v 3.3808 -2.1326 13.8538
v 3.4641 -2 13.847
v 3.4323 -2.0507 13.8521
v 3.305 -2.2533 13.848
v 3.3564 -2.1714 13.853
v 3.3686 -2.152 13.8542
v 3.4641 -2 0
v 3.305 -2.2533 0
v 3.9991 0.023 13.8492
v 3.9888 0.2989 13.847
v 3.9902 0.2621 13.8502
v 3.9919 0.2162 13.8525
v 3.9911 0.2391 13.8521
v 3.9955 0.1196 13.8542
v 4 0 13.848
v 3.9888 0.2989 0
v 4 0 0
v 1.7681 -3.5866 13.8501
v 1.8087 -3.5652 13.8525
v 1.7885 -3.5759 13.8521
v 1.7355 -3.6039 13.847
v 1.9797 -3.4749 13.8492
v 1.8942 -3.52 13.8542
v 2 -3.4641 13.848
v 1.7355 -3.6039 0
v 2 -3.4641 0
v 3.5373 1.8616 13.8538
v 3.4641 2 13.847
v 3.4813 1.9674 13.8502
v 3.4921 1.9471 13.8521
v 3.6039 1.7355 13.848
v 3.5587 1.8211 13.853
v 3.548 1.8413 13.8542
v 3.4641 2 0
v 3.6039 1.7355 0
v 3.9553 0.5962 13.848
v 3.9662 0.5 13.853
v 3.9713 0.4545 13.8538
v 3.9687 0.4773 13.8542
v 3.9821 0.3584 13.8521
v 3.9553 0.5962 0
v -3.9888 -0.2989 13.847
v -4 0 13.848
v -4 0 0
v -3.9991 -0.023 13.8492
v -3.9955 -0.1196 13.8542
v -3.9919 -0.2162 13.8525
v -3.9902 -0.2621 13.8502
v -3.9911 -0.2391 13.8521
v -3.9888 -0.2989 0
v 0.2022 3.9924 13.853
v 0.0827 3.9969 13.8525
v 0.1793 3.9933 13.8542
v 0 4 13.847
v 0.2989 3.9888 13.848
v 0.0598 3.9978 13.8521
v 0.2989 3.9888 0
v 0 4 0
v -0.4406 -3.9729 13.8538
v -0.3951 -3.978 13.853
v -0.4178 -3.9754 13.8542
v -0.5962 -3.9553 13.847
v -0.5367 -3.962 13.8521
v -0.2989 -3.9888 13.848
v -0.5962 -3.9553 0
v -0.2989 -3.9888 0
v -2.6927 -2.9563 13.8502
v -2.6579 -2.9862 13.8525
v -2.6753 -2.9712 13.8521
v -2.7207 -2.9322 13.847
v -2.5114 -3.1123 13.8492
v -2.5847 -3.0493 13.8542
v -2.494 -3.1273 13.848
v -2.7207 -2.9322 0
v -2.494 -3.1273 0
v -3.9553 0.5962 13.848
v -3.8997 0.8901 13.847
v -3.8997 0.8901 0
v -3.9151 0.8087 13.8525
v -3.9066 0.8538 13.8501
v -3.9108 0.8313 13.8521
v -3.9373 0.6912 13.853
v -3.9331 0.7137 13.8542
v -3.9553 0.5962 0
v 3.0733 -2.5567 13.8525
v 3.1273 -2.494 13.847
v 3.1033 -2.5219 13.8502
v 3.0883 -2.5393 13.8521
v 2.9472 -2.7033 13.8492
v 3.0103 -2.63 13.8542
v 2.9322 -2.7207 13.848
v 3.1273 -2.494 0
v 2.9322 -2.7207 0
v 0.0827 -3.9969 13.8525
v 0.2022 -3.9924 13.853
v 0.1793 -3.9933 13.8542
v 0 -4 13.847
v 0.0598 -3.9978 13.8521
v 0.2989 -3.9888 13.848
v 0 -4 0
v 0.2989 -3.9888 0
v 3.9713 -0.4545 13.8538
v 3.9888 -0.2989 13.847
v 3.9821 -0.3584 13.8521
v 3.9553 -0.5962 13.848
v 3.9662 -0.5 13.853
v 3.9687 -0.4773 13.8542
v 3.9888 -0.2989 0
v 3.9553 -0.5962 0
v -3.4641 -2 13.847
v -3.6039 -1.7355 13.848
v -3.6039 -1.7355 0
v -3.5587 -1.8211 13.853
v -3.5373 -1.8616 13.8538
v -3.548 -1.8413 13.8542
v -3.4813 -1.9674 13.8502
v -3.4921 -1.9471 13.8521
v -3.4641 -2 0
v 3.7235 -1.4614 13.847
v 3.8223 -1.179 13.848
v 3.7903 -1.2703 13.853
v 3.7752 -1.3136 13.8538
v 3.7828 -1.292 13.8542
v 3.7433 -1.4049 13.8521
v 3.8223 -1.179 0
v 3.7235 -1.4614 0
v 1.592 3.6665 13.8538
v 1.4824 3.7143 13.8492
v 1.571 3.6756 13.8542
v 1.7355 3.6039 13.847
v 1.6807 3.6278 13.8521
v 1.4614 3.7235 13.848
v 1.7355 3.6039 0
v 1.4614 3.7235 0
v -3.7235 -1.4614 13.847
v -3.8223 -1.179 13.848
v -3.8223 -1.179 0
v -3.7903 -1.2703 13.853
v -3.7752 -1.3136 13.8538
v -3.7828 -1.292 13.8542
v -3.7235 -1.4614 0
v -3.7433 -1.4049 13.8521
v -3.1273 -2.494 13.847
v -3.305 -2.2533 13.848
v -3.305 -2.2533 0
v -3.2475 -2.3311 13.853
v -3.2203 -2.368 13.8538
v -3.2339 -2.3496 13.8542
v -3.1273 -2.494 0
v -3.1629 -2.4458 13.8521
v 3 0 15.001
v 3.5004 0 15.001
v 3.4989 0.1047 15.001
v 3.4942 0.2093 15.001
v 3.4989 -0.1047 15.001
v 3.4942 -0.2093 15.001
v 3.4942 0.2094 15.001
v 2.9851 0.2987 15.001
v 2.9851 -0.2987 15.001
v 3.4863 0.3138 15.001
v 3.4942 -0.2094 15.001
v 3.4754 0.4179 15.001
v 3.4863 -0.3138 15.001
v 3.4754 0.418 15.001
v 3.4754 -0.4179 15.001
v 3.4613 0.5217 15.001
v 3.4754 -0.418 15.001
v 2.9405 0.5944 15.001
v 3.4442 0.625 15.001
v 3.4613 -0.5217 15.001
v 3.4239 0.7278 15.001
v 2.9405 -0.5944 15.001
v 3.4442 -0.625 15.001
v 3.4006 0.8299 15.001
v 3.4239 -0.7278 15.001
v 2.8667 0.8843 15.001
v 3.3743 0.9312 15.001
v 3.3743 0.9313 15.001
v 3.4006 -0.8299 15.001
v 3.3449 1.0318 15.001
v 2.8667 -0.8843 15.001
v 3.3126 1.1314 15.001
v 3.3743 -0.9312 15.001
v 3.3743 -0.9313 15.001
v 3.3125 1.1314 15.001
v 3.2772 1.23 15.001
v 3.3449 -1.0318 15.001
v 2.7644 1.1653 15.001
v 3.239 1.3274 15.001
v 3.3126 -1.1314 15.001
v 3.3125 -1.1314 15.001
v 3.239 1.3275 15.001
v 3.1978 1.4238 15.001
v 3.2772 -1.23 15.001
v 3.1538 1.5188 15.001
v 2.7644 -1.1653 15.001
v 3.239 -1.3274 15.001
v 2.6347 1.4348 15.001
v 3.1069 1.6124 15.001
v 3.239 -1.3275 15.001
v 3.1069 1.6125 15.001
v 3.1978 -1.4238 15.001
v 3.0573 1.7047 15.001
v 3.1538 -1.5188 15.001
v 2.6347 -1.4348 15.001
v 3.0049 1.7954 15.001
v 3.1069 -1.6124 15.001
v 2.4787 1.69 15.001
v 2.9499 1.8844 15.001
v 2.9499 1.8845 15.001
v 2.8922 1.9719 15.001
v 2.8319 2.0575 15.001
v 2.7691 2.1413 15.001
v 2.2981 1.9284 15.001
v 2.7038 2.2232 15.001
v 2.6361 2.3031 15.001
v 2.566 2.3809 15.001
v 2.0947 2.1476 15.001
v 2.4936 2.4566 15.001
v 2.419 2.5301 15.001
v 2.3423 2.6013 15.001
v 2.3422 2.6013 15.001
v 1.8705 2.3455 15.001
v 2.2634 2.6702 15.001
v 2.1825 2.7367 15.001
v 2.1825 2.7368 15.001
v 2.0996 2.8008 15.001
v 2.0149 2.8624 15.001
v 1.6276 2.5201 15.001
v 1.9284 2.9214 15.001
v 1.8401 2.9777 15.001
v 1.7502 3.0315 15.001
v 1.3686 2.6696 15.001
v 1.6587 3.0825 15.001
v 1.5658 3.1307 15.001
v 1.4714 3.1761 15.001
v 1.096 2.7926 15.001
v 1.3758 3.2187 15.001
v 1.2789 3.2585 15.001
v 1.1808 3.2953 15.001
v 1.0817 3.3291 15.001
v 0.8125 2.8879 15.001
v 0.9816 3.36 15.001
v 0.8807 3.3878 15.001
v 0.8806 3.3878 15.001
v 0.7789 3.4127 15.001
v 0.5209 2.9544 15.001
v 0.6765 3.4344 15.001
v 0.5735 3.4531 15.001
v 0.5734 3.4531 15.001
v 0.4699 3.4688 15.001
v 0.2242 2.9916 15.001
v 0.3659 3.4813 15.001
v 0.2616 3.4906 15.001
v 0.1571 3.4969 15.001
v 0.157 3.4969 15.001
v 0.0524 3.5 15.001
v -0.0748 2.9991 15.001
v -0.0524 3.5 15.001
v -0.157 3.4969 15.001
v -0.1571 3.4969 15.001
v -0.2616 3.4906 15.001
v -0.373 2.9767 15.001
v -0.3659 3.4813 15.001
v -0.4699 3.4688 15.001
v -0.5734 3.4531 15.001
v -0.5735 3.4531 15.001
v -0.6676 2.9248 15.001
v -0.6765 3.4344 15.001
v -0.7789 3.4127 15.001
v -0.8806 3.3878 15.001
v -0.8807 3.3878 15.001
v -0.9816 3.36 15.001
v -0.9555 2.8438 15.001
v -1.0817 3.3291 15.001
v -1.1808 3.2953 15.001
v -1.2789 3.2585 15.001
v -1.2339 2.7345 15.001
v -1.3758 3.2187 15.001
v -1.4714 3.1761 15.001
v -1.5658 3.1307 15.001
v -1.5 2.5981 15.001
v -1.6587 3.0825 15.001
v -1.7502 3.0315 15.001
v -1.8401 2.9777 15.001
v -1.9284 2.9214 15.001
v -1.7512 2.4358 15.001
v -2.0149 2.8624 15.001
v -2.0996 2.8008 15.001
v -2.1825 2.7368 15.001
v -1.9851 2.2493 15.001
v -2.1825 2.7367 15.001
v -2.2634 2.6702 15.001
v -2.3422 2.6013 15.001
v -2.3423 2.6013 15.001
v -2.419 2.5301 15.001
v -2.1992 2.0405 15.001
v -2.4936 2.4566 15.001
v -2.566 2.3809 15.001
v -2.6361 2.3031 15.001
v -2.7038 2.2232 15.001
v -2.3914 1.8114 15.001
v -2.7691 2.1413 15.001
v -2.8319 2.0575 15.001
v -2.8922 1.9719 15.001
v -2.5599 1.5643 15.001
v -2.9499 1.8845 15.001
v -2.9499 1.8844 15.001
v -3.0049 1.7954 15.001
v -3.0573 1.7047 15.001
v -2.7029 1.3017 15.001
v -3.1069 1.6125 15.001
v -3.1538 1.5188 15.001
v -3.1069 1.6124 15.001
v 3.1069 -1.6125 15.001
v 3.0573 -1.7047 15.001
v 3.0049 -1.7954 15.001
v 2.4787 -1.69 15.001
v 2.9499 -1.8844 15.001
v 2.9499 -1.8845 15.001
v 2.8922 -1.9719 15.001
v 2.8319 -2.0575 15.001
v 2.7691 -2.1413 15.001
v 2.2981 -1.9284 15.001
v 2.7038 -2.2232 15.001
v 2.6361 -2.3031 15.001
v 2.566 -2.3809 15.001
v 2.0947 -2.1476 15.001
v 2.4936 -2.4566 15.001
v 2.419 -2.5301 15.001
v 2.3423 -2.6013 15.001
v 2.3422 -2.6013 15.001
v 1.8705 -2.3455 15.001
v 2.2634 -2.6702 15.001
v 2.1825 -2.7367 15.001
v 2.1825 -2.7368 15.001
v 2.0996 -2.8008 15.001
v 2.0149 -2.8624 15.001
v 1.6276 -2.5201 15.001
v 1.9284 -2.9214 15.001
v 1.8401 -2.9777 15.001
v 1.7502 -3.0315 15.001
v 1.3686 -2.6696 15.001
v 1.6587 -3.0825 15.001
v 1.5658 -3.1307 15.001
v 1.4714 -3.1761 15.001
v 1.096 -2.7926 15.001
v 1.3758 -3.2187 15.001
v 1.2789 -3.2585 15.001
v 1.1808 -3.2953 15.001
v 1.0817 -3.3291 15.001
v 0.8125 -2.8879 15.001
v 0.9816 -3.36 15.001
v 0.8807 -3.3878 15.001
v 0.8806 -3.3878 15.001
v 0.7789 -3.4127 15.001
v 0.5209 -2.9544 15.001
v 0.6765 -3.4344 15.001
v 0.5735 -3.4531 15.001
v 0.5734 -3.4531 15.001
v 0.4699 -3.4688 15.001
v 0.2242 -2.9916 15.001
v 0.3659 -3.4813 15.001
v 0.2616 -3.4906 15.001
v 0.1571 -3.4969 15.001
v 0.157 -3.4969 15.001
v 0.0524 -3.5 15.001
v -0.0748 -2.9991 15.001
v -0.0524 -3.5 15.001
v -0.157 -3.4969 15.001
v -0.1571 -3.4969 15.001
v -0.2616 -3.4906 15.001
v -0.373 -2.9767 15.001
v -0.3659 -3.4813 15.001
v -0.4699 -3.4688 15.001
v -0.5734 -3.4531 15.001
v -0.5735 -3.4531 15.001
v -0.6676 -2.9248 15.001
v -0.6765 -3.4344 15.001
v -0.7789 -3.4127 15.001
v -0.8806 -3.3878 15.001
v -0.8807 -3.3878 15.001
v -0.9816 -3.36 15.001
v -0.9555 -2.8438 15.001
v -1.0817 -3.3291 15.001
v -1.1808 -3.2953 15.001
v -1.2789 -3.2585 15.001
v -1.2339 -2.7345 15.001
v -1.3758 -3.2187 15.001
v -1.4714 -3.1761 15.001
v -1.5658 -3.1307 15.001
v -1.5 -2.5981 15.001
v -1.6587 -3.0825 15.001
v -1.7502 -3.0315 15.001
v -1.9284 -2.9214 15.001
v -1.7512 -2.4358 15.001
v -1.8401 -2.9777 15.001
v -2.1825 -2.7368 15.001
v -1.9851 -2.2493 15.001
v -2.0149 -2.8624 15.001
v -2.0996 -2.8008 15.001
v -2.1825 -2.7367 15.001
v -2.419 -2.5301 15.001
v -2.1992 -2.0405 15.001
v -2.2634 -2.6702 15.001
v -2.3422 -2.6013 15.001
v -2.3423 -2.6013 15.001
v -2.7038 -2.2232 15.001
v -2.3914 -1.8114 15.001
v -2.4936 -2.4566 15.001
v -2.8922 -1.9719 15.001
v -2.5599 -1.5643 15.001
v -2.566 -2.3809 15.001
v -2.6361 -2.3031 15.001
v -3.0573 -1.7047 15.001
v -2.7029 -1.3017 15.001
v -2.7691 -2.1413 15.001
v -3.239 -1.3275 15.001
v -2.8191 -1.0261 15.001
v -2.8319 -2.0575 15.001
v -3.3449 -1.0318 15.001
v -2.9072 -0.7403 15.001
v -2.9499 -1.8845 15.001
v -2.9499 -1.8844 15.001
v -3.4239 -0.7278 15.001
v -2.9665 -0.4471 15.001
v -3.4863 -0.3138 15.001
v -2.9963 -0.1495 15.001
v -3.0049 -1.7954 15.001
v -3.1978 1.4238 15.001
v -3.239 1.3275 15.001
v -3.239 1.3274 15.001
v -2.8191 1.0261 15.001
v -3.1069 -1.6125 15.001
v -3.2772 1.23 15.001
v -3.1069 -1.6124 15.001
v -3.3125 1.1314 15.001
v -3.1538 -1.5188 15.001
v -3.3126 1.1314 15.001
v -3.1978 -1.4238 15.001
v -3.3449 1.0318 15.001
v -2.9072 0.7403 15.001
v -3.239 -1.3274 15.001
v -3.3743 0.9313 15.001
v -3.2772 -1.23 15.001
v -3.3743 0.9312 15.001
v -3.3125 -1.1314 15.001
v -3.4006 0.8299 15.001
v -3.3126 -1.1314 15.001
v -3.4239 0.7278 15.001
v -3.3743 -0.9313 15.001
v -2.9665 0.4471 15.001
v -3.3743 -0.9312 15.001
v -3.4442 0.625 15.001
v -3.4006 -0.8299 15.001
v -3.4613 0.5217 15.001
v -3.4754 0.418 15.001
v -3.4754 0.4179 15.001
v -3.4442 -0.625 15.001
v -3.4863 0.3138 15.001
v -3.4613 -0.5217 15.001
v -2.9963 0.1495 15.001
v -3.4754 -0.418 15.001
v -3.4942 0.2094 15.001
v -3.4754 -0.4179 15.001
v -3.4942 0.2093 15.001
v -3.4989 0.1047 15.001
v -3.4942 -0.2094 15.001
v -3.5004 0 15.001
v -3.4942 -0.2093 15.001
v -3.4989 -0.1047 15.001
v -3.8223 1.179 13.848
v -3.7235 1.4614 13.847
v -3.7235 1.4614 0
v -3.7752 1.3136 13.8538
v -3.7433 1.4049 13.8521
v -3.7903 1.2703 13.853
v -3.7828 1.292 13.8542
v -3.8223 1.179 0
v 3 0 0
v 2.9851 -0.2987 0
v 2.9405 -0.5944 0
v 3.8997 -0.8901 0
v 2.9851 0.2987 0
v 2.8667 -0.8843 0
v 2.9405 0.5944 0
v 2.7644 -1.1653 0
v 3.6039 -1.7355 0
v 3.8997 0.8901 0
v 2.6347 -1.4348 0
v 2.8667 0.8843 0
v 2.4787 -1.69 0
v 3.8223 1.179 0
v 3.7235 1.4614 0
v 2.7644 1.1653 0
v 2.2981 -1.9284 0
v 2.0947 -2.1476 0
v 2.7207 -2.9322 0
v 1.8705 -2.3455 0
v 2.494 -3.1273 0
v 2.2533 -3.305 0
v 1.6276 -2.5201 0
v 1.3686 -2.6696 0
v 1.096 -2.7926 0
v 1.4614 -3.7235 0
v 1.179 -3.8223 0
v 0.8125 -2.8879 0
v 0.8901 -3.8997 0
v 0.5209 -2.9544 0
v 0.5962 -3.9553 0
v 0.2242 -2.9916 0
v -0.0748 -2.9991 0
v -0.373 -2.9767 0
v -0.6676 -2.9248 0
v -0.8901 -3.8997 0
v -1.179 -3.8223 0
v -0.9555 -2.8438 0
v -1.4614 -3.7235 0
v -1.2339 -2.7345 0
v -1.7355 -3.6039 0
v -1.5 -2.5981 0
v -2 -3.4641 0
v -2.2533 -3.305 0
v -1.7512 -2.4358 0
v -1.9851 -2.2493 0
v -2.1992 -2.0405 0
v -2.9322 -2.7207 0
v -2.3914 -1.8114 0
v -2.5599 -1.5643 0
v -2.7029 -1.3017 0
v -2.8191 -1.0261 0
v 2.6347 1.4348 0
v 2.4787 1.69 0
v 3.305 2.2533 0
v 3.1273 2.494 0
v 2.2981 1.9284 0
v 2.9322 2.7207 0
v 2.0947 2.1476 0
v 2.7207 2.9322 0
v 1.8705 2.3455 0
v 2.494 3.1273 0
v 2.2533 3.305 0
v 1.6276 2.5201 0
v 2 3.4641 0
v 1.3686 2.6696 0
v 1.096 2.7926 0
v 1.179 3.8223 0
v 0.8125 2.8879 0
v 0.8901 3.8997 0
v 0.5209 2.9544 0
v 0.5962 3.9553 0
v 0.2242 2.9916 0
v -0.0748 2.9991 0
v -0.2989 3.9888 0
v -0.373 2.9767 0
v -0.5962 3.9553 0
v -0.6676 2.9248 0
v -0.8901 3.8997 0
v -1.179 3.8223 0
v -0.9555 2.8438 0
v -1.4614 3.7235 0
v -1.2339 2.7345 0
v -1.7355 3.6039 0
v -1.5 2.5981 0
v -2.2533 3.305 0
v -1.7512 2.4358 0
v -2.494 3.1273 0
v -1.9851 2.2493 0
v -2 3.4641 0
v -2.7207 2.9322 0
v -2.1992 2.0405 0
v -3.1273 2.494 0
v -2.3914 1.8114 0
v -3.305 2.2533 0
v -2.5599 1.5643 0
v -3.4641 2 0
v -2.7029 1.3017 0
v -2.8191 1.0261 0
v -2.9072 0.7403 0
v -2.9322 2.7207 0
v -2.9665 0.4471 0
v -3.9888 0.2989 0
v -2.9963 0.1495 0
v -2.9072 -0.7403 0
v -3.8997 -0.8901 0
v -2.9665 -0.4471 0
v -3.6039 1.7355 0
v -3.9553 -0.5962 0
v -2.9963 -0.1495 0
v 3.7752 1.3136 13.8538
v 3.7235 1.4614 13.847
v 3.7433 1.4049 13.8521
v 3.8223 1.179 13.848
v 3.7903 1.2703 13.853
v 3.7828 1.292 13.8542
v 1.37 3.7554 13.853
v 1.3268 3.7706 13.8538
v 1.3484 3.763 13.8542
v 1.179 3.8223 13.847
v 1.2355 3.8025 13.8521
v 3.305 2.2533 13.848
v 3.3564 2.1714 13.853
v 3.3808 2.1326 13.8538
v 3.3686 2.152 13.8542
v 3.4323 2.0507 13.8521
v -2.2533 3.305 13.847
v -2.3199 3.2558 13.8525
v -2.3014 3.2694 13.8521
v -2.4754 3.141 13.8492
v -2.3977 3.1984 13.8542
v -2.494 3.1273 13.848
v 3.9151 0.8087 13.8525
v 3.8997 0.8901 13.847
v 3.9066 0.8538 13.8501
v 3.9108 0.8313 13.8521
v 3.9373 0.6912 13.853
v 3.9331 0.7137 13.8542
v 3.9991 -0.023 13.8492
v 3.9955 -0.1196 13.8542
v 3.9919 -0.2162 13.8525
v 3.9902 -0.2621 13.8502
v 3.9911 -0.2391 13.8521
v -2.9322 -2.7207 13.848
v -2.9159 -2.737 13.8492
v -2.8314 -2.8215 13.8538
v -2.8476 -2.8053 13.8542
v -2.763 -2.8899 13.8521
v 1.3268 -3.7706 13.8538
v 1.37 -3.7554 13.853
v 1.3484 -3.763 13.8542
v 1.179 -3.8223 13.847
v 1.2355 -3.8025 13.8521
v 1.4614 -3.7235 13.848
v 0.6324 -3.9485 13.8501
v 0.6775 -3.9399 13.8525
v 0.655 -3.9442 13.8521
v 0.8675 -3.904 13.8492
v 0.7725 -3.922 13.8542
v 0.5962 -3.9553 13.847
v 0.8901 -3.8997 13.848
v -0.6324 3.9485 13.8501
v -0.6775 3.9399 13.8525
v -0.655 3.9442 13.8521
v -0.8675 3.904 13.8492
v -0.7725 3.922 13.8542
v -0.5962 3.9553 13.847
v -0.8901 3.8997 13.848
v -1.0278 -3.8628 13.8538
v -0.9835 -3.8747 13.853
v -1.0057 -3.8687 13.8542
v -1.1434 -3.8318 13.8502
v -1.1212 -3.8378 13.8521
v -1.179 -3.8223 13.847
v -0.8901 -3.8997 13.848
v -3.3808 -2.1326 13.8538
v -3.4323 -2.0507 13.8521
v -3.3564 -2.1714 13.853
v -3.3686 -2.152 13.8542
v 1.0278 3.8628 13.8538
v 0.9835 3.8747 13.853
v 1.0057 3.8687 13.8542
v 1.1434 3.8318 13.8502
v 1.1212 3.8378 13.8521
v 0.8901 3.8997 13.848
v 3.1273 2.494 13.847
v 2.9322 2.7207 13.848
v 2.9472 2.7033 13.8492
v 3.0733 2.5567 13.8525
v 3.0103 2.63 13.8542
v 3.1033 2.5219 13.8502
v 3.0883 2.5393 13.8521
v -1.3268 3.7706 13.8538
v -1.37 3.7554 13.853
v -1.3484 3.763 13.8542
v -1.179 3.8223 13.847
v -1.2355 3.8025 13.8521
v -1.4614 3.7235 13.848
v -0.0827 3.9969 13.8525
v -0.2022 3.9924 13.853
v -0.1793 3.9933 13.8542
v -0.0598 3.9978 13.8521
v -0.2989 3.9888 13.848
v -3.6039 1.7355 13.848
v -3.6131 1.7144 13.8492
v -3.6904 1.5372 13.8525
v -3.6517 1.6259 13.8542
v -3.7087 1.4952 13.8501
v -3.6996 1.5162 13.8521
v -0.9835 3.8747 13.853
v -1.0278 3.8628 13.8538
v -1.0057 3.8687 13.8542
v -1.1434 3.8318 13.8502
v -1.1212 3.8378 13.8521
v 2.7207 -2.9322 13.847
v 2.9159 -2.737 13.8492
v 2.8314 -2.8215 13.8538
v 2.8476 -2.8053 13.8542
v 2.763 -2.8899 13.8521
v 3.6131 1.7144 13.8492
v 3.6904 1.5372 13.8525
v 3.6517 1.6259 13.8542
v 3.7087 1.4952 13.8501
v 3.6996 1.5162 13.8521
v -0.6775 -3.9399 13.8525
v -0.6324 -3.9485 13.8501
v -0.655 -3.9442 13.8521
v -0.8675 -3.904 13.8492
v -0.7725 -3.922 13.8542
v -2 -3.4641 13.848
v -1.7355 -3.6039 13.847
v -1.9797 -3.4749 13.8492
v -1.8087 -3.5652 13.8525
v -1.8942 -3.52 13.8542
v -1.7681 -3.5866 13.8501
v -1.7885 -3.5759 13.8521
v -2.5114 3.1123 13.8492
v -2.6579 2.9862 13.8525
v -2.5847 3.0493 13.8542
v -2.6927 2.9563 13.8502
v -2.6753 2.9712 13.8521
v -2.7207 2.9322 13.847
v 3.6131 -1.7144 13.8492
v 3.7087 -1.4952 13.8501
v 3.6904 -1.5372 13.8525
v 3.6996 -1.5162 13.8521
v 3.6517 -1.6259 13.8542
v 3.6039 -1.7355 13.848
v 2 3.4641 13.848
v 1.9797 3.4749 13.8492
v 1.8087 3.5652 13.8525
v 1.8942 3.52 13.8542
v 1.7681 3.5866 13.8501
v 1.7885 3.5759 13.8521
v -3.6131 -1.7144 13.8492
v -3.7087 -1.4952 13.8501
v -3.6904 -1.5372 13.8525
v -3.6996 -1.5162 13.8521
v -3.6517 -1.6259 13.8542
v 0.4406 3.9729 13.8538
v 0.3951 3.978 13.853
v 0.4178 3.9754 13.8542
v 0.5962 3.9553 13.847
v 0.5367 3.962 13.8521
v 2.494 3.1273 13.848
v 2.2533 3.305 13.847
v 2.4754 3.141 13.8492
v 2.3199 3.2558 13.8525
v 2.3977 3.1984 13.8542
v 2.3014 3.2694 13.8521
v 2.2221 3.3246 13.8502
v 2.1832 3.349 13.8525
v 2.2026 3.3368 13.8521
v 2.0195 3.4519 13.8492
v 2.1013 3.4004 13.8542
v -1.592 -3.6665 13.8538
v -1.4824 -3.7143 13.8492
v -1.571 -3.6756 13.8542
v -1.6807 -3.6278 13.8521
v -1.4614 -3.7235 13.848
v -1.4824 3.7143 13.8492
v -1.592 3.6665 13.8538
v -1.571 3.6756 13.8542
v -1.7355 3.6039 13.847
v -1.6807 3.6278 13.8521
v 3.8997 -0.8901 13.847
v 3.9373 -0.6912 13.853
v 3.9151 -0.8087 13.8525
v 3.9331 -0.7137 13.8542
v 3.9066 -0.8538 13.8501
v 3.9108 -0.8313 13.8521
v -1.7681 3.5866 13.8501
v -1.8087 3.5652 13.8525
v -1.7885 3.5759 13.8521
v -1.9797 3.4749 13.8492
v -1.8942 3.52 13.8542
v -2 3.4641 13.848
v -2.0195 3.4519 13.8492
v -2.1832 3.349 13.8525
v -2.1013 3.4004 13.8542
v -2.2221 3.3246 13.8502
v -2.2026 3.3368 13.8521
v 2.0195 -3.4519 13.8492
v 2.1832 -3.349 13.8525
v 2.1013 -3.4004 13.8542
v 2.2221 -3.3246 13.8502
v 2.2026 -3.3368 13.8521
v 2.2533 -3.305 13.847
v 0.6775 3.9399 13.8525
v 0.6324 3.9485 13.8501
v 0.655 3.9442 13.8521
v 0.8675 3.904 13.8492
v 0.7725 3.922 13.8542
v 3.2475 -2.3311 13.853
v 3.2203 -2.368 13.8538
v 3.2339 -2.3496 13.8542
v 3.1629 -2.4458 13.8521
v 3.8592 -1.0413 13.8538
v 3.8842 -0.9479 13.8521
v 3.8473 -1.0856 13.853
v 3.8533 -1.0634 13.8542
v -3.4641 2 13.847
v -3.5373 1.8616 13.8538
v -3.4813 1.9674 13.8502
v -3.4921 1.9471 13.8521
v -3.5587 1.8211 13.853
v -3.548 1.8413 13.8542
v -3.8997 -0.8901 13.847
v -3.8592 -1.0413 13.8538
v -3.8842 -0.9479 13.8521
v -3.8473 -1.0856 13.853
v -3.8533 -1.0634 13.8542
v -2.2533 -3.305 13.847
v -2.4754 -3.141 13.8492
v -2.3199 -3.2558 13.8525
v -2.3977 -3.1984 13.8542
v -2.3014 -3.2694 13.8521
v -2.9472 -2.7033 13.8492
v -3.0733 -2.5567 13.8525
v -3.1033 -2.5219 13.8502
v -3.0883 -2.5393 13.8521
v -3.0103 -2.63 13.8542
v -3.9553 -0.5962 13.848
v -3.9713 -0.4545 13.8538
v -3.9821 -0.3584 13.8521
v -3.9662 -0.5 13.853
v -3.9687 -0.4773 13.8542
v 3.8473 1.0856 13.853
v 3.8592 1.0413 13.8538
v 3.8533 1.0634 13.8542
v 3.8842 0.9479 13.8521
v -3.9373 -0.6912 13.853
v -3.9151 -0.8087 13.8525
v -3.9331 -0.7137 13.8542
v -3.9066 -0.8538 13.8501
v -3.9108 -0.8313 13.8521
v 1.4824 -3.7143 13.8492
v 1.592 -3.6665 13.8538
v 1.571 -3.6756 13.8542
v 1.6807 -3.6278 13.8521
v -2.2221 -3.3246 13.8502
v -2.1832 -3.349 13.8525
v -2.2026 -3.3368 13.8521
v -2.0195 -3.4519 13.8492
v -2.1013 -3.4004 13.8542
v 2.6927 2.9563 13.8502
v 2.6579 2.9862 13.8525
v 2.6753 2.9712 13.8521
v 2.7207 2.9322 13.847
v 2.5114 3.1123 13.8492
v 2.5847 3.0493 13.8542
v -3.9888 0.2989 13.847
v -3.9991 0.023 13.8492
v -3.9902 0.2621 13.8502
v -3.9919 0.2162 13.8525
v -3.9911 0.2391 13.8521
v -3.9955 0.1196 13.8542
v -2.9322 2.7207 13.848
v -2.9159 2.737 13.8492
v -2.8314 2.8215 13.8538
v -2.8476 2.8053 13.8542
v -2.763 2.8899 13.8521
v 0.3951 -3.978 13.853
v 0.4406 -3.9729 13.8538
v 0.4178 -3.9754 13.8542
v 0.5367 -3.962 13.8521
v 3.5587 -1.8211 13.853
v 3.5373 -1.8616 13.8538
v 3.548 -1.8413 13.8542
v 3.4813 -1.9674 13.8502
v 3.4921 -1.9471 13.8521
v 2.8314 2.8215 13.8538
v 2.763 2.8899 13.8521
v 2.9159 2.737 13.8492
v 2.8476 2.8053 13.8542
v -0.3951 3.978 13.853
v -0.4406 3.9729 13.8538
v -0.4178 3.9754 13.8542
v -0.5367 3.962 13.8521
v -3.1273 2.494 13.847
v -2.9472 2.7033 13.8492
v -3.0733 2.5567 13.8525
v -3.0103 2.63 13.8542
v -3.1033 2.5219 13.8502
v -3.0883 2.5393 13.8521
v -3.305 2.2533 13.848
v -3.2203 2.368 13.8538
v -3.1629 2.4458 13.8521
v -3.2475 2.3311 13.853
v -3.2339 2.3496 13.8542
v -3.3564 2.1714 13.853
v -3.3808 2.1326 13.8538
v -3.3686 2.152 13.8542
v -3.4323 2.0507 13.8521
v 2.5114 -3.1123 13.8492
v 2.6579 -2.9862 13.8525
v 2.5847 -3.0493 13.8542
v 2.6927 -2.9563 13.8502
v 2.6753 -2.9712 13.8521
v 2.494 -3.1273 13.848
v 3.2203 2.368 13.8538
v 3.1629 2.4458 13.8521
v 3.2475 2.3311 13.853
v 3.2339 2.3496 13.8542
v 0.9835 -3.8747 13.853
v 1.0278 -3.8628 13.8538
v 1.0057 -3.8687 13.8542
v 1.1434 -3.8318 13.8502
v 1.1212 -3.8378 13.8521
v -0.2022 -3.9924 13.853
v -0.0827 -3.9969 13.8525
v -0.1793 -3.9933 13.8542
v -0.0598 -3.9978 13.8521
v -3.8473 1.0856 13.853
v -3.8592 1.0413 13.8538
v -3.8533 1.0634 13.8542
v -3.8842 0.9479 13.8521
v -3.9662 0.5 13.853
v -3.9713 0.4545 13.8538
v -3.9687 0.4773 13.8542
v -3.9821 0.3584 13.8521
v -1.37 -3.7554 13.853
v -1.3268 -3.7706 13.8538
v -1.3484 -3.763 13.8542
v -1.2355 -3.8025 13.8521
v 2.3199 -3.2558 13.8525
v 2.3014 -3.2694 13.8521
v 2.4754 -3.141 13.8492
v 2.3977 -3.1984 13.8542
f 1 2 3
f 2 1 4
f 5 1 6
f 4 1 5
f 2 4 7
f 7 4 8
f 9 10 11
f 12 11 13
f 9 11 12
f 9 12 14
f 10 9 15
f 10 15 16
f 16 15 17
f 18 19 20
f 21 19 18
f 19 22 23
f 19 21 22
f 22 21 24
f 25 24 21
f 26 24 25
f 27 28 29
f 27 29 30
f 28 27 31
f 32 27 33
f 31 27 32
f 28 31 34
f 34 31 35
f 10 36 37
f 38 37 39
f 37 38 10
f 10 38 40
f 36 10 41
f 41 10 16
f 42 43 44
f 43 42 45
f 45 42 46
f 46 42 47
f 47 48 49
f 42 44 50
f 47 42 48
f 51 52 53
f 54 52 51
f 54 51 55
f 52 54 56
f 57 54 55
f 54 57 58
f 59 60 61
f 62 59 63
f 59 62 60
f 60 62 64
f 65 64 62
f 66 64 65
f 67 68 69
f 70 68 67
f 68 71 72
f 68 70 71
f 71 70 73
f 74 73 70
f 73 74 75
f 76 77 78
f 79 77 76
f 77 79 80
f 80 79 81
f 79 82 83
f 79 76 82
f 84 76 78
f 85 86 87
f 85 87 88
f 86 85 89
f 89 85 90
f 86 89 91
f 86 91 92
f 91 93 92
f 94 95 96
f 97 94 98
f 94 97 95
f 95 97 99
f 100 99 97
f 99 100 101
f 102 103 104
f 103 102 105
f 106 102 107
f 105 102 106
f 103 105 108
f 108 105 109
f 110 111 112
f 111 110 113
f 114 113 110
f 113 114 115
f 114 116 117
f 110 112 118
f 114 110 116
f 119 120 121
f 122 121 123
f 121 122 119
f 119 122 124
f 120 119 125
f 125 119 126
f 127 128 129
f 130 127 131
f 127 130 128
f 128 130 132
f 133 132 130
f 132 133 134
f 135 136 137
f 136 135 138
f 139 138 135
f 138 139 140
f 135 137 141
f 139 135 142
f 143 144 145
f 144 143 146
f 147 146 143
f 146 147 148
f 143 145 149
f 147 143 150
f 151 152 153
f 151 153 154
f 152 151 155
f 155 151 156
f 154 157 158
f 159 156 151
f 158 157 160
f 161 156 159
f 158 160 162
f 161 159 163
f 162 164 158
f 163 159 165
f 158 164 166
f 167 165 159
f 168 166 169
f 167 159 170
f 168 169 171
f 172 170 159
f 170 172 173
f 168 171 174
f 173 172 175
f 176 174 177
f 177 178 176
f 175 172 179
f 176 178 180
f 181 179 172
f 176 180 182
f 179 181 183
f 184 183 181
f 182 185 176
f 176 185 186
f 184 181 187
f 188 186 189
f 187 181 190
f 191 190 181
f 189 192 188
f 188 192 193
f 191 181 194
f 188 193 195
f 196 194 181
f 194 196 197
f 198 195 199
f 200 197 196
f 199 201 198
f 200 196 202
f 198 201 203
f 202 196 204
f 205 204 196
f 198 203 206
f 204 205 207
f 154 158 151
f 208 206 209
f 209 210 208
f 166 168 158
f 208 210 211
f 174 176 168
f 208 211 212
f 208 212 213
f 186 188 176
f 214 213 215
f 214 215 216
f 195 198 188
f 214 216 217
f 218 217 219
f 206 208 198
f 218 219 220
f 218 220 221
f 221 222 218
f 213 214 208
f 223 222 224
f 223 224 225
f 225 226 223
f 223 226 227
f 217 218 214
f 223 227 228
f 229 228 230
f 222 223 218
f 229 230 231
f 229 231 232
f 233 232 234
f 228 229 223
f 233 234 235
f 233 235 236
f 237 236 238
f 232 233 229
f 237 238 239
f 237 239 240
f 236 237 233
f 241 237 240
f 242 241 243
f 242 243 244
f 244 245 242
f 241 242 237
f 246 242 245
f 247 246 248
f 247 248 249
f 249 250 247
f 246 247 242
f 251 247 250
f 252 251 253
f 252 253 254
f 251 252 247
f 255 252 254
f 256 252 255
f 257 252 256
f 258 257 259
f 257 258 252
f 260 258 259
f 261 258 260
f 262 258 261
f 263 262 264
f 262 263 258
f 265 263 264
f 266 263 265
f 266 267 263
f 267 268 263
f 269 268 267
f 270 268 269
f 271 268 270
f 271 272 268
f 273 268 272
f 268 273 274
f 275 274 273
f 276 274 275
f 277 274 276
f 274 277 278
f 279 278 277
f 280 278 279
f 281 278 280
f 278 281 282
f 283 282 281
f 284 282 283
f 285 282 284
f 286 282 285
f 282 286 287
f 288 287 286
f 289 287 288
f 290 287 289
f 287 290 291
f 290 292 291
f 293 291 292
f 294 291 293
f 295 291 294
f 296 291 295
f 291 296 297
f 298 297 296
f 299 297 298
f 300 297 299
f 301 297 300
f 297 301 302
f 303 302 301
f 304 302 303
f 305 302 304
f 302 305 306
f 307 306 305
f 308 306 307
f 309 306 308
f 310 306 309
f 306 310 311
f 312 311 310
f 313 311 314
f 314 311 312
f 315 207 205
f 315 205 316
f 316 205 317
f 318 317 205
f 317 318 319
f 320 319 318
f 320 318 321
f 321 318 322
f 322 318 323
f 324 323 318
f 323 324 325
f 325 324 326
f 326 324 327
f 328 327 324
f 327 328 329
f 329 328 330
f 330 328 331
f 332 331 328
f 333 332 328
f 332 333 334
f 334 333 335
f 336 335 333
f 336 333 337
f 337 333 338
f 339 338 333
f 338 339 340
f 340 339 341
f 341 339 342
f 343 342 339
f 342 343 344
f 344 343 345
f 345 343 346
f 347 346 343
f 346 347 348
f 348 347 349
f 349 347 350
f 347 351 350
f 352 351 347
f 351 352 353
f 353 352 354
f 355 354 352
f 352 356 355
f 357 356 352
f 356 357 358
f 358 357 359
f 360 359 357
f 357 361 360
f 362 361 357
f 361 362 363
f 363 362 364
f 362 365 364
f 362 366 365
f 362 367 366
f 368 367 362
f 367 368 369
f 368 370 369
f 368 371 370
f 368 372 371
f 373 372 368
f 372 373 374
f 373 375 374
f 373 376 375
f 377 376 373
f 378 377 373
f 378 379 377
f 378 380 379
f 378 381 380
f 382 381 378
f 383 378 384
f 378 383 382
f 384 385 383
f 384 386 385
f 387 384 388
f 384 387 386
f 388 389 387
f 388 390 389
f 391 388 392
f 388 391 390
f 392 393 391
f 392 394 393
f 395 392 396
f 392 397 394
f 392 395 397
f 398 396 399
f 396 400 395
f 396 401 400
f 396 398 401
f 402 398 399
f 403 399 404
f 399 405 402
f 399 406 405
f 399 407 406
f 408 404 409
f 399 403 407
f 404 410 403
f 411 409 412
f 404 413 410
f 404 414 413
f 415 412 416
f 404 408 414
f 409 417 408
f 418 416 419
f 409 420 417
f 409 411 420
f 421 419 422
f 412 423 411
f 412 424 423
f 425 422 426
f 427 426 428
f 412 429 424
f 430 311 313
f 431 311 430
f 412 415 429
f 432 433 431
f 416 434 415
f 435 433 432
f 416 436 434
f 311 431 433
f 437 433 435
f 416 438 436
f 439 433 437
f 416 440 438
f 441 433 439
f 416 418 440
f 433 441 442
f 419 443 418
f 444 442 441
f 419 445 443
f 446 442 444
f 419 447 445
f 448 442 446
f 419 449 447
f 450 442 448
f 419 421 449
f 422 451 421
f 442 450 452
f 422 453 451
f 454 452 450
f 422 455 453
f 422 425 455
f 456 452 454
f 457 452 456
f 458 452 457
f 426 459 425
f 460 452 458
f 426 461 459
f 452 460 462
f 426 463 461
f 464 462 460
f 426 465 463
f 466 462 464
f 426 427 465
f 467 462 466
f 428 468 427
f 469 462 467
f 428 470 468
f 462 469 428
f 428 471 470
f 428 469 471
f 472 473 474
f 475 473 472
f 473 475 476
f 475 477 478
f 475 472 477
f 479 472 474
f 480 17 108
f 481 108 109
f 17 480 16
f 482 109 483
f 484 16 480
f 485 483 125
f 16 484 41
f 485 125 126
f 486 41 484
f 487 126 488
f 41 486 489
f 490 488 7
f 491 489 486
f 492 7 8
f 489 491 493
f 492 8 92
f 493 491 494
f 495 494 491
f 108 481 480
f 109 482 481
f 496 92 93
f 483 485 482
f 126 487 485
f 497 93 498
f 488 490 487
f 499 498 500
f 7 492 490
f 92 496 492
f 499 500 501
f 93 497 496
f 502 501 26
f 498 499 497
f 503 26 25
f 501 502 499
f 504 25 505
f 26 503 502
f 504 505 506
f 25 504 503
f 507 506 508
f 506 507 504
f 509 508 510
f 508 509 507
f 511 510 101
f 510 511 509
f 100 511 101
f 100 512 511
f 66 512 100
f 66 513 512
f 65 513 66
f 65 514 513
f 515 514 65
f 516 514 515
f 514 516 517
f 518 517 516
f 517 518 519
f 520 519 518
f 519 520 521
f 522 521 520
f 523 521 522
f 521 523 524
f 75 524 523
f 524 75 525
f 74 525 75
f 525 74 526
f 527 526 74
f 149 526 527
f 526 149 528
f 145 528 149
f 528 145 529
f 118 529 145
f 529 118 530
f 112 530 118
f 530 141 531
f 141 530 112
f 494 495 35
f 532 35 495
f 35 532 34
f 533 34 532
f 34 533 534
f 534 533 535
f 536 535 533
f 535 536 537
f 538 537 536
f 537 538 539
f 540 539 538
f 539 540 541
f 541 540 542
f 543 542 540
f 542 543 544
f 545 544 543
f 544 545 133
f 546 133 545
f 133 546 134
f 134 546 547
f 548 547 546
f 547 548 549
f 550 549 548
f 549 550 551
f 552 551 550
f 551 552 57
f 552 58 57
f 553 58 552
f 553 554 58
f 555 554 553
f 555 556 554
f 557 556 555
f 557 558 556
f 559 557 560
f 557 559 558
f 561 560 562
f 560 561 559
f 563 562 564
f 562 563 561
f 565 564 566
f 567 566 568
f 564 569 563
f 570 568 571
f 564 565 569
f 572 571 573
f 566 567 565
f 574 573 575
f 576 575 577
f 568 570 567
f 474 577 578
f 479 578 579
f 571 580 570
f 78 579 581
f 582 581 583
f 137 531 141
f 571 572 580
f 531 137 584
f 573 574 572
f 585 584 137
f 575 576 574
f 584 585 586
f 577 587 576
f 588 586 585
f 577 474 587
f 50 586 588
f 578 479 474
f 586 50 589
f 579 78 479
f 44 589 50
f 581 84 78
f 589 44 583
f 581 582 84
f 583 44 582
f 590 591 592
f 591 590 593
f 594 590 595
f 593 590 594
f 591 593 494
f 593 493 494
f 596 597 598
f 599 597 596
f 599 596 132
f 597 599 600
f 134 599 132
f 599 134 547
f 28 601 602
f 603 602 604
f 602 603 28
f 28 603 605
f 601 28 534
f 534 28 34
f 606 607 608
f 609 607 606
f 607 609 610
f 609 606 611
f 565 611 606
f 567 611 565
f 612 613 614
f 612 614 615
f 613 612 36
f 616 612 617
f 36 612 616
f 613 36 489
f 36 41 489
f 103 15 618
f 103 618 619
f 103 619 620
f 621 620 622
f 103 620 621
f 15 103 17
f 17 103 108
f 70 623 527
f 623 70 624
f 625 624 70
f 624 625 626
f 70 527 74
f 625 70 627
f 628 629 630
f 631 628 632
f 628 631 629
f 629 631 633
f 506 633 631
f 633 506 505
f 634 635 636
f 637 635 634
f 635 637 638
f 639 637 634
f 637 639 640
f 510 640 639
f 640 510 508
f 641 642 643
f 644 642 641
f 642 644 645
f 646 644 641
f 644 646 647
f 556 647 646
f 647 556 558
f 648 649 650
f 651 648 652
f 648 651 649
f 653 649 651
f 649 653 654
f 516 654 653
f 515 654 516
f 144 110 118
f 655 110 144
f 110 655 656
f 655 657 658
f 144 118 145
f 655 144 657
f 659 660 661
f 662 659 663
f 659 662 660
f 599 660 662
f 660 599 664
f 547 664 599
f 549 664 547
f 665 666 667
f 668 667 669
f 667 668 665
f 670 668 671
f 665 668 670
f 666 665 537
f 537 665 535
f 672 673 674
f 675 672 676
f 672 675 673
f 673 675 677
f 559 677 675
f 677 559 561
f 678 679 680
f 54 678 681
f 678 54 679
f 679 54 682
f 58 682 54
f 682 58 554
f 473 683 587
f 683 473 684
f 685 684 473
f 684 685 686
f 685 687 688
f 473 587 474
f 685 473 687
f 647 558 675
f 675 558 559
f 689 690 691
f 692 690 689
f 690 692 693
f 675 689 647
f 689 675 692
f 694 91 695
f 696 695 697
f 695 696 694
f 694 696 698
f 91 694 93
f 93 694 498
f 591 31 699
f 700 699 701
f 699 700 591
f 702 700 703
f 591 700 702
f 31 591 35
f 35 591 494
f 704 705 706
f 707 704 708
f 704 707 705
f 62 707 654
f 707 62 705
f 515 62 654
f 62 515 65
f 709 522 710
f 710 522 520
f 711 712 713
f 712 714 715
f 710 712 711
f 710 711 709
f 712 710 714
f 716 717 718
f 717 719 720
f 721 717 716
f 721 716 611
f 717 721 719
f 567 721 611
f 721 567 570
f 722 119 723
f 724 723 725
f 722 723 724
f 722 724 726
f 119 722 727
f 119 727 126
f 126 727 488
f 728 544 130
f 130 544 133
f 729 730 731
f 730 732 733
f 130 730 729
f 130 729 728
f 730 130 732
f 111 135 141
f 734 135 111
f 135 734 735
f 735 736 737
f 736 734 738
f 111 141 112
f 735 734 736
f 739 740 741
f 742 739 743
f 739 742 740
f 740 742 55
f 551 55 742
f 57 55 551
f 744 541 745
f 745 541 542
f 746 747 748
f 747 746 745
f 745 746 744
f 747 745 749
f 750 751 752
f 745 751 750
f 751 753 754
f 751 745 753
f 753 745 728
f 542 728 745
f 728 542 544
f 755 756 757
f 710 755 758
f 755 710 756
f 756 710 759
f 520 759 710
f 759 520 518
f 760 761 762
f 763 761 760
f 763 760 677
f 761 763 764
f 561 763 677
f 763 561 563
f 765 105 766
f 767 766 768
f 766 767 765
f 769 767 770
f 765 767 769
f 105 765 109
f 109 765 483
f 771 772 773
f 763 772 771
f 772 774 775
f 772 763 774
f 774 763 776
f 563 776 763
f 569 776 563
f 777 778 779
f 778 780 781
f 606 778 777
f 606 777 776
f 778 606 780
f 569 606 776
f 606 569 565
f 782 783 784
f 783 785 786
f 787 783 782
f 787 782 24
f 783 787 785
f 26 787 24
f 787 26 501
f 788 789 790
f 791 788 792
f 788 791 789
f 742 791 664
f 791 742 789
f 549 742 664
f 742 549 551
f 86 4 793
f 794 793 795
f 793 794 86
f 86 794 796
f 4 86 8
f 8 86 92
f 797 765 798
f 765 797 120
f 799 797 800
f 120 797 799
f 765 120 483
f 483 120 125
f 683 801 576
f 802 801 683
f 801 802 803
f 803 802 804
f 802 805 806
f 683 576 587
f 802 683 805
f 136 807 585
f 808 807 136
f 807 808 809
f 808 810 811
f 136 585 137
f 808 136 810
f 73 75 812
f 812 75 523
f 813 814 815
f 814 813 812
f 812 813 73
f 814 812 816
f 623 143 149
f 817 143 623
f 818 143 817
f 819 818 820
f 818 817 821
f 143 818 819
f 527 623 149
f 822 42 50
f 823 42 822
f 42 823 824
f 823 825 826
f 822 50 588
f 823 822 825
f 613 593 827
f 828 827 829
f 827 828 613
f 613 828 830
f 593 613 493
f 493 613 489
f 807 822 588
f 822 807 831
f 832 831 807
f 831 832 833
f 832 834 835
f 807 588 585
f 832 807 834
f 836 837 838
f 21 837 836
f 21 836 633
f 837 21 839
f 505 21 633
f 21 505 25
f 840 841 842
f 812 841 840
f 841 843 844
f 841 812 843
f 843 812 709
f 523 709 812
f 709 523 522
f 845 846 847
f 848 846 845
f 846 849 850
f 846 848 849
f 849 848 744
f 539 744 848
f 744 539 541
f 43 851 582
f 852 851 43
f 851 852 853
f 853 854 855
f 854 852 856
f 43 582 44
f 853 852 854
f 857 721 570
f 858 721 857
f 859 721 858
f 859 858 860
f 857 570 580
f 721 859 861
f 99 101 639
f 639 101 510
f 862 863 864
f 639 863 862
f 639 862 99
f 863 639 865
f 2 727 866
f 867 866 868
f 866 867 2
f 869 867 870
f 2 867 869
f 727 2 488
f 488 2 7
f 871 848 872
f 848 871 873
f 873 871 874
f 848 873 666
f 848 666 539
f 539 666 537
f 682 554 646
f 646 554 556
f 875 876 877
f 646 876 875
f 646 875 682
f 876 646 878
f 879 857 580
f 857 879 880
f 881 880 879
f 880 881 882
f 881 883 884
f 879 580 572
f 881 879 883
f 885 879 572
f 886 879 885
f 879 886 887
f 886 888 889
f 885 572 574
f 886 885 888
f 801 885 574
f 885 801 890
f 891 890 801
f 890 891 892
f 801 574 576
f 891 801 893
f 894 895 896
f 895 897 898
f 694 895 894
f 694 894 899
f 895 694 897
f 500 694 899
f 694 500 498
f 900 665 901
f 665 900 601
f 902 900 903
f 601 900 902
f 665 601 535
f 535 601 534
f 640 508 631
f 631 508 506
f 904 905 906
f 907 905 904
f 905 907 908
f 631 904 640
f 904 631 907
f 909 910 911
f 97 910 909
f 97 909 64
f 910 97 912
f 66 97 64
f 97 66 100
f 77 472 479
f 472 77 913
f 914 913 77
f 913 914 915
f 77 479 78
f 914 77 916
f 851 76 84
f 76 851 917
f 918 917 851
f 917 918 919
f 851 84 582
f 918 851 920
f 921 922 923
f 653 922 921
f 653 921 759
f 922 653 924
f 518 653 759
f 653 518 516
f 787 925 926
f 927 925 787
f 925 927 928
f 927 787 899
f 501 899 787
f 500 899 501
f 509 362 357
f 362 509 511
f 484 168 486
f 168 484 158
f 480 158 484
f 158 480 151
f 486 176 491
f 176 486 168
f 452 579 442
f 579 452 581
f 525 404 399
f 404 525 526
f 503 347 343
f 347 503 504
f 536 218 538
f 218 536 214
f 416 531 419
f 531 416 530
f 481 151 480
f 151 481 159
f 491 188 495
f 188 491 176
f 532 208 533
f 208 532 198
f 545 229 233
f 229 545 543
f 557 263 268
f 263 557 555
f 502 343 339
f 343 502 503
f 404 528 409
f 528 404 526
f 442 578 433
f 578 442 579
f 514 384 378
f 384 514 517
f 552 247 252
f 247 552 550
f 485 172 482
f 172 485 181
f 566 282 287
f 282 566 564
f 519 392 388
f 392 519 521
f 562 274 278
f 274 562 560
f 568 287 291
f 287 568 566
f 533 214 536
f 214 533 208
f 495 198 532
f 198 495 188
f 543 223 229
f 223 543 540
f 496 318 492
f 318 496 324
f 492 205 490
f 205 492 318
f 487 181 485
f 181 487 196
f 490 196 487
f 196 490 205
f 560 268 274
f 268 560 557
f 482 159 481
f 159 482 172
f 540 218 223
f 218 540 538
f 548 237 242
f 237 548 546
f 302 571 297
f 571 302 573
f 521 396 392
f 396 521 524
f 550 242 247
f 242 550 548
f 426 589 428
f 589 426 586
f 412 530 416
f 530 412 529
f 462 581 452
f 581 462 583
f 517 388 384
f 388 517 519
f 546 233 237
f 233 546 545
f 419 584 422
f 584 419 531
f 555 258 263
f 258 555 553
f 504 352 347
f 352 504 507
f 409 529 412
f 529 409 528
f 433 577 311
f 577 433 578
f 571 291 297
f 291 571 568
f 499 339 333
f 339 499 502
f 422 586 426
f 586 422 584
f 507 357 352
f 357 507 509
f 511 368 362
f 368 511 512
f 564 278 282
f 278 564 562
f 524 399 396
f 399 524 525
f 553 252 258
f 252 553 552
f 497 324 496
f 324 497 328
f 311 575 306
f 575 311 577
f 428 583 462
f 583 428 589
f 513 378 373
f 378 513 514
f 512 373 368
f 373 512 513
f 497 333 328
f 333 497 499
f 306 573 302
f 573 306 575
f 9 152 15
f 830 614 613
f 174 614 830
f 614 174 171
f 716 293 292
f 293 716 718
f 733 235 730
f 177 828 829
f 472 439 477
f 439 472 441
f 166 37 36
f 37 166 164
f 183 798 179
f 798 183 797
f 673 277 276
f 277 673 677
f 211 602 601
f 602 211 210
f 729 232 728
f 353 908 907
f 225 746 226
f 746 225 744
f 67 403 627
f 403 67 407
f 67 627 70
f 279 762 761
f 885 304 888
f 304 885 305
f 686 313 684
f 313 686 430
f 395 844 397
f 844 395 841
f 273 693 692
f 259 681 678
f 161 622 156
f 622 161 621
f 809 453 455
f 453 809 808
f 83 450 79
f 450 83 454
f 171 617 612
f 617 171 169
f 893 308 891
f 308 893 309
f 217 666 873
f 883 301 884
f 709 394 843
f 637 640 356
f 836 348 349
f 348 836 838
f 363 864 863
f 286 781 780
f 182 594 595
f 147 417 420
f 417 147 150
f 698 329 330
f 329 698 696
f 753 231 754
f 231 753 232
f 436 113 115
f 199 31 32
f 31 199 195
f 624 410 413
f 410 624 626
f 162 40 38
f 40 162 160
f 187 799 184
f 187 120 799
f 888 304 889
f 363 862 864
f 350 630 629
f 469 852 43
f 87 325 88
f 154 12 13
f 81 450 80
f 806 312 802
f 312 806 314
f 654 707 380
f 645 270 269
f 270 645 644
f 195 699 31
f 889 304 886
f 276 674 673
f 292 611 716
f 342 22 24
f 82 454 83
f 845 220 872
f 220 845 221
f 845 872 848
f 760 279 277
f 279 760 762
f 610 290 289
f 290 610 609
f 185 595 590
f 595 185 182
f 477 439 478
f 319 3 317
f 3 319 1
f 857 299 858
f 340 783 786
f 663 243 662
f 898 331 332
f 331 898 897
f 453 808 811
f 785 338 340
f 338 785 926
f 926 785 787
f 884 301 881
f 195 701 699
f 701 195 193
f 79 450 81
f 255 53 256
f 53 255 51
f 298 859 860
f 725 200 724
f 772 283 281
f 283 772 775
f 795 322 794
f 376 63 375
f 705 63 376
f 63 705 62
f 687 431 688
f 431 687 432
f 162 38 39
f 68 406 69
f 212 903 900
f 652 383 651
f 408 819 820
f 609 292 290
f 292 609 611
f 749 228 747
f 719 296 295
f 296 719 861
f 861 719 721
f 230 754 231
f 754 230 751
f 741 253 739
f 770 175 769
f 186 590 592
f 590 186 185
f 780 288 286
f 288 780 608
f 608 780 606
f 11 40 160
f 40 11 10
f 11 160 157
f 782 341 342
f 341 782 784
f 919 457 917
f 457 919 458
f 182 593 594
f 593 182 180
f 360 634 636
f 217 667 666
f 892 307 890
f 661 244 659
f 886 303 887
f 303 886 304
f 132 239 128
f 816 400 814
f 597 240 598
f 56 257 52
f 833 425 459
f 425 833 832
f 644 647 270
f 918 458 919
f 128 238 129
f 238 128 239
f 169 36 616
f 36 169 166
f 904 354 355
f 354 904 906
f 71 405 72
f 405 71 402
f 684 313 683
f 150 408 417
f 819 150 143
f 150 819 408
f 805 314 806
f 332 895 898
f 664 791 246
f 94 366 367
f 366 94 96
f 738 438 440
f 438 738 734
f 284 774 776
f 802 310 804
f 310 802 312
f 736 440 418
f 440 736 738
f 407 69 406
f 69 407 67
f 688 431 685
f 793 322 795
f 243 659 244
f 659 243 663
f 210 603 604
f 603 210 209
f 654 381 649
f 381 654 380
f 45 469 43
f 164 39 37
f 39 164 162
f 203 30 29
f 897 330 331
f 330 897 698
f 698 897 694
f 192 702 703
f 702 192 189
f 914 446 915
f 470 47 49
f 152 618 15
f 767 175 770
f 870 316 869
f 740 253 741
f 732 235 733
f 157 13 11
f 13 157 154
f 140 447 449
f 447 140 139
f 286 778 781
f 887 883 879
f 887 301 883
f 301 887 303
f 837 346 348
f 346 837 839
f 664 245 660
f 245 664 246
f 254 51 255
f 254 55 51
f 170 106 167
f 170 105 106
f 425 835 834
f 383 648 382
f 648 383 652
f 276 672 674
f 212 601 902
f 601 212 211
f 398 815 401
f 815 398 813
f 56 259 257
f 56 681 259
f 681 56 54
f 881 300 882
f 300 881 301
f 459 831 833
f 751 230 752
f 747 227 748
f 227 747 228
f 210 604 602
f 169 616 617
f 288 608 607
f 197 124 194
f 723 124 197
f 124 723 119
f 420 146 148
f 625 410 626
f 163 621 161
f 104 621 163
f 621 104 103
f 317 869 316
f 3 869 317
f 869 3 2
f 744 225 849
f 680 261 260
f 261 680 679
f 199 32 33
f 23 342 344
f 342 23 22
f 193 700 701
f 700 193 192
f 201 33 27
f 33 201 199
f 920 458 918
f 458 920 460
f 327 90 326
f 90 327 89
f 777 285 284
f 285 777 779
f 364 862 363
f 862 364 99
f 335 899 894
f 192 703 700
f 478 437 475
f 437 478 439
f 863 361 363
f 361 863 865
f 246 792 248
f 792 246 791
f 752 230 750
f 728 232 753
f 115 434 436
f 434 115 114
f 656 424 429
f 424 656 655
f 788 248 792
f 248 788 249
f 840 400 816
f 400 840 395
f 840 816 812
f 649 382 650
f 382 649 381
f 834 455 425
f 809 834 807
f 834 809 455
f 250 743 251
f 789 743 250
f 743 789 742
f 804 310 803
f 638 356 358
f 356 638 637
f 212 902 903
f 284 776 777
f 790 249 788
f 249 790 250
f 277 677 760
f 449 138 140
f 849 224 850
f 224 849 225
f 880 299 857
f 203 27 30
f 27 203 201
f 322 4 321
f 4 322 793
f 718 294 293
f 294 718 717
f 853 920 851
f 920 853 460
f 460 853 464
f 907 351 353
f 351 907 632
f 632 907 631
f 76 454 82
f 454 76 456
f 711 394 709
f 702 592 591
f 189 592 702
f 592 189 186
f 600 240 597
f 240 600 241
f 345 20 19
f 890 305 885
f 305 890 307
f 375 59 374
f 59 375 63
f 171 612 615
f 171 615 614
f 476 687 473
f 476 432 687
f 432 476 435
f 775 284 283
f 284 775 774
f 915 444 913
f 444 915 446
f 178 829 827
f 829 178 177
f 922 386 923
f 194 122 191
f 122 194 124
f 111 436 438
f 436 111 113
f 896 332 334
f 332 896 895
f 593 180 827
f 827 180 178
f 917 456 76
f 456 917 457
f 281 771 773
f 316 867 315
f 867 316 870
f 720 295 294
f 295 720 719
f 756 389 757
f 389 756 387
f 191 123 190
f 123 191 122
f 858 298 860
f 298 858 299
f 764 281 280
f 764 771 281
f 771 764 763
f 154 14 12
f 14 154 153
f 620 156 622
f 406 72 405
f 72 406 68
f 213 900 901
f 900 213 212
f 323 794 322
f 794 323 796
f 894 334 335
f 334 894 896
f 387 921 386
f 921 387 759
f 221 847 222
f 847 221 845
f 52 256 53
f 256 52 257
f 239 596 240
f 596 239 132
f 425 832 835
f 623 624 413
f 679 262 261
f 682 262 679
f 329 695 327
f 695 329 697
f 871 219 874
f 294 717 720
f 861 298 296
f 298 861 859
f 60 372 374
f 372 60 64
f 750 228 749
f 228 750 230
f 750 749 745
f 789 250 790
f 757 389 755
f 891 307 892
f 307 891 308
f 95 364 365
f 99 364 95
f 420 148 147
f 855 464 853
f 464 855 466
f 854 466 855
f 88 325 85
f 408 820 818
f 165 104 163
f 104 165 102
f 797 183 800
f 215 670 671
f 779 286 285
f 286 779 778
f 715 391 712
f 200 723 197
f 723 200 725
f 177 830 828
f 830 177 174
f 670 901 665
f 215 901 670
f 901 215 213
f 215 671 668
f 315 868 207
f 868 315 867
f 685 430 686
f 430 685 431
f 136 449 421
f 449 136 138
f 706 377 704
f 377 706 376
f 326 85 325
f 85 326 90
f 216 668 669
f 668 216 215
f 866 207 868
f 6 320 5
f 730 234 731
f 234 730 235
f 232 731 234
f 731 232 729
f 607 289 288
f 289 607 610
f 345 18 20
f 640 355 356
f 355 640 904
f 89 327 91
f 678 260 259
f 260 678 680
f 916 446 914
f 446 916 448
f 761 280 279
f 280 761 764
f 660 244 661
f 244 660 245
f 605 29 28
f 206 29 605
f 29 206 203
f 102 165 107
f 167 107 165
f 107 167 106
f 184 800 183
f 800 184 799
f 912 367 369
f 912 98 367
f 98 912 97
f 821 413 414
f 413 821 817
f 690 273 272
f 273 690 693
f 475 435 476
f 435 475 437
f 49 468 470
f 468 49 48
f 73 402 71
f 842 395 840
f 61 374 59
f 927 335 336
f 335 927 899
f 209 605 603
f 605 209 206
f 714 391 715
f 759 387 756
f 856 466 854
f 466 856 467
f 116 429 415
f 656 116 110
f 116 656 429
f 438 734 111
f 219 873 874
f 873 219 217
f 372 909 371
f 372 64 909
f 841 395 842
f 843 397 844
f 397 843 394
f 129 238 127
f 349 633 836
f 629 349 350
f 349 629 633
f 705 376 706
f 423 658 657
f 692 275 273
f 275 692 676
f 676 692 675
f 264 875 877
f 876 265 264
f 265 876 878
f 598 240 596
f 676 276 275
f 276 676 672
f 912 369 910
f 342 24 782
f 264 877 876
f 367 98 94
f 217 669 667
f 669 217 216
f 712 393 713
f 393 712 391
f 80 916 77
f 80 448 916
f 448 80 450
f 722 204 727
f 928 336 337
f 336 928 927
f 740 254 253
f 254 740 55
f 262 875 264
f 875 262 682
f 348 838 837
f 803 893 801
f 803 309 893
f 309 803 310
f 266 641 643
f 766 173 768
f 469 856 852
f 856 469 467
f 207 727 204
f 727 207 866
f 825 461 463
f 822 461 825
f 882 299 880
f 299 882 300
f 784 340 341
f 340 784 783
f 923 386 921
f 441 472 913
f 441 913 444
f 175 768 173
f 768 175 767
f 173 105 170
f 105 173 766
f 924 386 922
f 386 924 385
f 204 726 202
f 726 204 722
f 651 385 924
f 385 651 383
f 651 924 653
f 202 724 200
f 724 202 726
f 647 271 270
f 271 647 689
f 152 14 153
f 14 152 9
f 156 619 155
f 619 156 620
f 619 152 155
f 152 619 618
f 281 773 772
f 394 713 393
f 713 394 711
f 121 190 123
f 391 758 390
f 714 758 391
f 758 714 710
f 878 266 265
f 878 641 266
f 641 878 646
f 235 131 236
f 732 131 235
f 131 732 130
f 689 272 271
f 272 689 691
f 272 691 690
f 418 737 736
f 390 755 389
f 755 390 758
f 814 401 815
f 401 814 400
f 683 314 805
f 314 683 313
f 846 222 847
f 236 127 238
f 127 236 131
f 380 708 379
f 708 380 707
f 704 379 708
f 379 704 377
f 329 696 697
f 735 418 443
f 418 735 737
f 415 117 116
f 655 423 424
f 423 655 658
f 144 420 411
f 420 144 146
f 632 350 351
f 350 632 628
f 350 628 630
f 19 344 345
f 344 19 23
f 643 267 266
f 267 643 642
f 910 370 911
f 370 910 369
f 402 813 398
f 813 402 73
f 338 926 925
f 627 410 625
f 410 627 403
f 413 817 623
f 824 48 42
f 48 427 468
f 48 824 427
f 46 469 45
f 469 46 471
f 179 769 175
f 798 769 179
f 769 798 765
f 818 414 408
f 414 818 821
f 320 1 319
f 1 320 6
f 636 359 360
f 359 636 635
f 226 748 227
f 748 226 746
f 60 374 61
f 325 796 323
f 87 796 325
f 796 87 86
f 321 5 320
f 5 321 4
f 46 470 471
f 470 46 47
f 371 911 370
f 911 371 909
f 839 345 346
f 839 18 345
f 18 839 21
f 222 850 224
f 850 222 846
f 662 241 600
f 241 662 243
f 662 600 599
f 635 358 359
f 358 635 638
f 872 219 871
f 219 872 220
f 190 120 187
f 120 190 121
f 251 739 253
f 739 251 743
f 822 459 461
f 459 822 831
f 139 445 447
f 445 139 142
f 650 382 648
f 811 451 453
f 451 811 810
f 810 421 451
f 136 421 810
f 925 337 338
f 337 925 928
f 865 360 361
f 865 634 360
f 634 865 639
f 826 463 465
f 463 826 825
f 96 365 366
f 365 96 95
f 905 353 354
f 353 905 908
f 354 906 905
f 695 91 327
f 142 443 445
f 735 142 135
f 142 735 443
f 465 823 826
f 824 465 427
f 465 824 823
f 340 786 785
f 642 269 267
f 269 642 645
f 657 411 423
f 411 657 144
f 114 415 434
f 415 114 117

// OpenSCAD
$fa = 1;
$fs = 0.3;

D = 0.001;
t = 0.3333333333333;
rodRadius = 3.1;
wallThickness = 3;
cellWidth = 20;
chamberHeight = 80;
solenoidBottomScrewFromTop = 43;
solenoidBottomScrewDistance = 15;
solenoidScrewR = 1;
valveHeight = 5;
outputInnerR = 3;
outputOuterR = 4;
spuntikHeight = 10;
spuntikDiraHeight = 5;
spuntikDiraRadius = 1;
connectorHeight = 15;
konektorWidth = 28;
kabelyHeight = 2;
kabelyWidth = 12;
kabelyOffsetHeight = 10;
kabelyOffsetWidth = 2;

valveBigR = cellWidth / 2 - wallThickness / 2;

I = 3;
slack = 1.05;

translate([ 0, 0, 0 ]) intersection()
{
    difference()
    {
        cylinder(connectorHeight + D, outputOuterR, outputOuterR, false);
        cylinder(connectorHeight + 2 * D, outputInnerR, outputInnerR, false);
    }
    cylinder(connectorHeight + 2 * D, cellWidth / 2, outputInnerR + 0.5, false);
}
